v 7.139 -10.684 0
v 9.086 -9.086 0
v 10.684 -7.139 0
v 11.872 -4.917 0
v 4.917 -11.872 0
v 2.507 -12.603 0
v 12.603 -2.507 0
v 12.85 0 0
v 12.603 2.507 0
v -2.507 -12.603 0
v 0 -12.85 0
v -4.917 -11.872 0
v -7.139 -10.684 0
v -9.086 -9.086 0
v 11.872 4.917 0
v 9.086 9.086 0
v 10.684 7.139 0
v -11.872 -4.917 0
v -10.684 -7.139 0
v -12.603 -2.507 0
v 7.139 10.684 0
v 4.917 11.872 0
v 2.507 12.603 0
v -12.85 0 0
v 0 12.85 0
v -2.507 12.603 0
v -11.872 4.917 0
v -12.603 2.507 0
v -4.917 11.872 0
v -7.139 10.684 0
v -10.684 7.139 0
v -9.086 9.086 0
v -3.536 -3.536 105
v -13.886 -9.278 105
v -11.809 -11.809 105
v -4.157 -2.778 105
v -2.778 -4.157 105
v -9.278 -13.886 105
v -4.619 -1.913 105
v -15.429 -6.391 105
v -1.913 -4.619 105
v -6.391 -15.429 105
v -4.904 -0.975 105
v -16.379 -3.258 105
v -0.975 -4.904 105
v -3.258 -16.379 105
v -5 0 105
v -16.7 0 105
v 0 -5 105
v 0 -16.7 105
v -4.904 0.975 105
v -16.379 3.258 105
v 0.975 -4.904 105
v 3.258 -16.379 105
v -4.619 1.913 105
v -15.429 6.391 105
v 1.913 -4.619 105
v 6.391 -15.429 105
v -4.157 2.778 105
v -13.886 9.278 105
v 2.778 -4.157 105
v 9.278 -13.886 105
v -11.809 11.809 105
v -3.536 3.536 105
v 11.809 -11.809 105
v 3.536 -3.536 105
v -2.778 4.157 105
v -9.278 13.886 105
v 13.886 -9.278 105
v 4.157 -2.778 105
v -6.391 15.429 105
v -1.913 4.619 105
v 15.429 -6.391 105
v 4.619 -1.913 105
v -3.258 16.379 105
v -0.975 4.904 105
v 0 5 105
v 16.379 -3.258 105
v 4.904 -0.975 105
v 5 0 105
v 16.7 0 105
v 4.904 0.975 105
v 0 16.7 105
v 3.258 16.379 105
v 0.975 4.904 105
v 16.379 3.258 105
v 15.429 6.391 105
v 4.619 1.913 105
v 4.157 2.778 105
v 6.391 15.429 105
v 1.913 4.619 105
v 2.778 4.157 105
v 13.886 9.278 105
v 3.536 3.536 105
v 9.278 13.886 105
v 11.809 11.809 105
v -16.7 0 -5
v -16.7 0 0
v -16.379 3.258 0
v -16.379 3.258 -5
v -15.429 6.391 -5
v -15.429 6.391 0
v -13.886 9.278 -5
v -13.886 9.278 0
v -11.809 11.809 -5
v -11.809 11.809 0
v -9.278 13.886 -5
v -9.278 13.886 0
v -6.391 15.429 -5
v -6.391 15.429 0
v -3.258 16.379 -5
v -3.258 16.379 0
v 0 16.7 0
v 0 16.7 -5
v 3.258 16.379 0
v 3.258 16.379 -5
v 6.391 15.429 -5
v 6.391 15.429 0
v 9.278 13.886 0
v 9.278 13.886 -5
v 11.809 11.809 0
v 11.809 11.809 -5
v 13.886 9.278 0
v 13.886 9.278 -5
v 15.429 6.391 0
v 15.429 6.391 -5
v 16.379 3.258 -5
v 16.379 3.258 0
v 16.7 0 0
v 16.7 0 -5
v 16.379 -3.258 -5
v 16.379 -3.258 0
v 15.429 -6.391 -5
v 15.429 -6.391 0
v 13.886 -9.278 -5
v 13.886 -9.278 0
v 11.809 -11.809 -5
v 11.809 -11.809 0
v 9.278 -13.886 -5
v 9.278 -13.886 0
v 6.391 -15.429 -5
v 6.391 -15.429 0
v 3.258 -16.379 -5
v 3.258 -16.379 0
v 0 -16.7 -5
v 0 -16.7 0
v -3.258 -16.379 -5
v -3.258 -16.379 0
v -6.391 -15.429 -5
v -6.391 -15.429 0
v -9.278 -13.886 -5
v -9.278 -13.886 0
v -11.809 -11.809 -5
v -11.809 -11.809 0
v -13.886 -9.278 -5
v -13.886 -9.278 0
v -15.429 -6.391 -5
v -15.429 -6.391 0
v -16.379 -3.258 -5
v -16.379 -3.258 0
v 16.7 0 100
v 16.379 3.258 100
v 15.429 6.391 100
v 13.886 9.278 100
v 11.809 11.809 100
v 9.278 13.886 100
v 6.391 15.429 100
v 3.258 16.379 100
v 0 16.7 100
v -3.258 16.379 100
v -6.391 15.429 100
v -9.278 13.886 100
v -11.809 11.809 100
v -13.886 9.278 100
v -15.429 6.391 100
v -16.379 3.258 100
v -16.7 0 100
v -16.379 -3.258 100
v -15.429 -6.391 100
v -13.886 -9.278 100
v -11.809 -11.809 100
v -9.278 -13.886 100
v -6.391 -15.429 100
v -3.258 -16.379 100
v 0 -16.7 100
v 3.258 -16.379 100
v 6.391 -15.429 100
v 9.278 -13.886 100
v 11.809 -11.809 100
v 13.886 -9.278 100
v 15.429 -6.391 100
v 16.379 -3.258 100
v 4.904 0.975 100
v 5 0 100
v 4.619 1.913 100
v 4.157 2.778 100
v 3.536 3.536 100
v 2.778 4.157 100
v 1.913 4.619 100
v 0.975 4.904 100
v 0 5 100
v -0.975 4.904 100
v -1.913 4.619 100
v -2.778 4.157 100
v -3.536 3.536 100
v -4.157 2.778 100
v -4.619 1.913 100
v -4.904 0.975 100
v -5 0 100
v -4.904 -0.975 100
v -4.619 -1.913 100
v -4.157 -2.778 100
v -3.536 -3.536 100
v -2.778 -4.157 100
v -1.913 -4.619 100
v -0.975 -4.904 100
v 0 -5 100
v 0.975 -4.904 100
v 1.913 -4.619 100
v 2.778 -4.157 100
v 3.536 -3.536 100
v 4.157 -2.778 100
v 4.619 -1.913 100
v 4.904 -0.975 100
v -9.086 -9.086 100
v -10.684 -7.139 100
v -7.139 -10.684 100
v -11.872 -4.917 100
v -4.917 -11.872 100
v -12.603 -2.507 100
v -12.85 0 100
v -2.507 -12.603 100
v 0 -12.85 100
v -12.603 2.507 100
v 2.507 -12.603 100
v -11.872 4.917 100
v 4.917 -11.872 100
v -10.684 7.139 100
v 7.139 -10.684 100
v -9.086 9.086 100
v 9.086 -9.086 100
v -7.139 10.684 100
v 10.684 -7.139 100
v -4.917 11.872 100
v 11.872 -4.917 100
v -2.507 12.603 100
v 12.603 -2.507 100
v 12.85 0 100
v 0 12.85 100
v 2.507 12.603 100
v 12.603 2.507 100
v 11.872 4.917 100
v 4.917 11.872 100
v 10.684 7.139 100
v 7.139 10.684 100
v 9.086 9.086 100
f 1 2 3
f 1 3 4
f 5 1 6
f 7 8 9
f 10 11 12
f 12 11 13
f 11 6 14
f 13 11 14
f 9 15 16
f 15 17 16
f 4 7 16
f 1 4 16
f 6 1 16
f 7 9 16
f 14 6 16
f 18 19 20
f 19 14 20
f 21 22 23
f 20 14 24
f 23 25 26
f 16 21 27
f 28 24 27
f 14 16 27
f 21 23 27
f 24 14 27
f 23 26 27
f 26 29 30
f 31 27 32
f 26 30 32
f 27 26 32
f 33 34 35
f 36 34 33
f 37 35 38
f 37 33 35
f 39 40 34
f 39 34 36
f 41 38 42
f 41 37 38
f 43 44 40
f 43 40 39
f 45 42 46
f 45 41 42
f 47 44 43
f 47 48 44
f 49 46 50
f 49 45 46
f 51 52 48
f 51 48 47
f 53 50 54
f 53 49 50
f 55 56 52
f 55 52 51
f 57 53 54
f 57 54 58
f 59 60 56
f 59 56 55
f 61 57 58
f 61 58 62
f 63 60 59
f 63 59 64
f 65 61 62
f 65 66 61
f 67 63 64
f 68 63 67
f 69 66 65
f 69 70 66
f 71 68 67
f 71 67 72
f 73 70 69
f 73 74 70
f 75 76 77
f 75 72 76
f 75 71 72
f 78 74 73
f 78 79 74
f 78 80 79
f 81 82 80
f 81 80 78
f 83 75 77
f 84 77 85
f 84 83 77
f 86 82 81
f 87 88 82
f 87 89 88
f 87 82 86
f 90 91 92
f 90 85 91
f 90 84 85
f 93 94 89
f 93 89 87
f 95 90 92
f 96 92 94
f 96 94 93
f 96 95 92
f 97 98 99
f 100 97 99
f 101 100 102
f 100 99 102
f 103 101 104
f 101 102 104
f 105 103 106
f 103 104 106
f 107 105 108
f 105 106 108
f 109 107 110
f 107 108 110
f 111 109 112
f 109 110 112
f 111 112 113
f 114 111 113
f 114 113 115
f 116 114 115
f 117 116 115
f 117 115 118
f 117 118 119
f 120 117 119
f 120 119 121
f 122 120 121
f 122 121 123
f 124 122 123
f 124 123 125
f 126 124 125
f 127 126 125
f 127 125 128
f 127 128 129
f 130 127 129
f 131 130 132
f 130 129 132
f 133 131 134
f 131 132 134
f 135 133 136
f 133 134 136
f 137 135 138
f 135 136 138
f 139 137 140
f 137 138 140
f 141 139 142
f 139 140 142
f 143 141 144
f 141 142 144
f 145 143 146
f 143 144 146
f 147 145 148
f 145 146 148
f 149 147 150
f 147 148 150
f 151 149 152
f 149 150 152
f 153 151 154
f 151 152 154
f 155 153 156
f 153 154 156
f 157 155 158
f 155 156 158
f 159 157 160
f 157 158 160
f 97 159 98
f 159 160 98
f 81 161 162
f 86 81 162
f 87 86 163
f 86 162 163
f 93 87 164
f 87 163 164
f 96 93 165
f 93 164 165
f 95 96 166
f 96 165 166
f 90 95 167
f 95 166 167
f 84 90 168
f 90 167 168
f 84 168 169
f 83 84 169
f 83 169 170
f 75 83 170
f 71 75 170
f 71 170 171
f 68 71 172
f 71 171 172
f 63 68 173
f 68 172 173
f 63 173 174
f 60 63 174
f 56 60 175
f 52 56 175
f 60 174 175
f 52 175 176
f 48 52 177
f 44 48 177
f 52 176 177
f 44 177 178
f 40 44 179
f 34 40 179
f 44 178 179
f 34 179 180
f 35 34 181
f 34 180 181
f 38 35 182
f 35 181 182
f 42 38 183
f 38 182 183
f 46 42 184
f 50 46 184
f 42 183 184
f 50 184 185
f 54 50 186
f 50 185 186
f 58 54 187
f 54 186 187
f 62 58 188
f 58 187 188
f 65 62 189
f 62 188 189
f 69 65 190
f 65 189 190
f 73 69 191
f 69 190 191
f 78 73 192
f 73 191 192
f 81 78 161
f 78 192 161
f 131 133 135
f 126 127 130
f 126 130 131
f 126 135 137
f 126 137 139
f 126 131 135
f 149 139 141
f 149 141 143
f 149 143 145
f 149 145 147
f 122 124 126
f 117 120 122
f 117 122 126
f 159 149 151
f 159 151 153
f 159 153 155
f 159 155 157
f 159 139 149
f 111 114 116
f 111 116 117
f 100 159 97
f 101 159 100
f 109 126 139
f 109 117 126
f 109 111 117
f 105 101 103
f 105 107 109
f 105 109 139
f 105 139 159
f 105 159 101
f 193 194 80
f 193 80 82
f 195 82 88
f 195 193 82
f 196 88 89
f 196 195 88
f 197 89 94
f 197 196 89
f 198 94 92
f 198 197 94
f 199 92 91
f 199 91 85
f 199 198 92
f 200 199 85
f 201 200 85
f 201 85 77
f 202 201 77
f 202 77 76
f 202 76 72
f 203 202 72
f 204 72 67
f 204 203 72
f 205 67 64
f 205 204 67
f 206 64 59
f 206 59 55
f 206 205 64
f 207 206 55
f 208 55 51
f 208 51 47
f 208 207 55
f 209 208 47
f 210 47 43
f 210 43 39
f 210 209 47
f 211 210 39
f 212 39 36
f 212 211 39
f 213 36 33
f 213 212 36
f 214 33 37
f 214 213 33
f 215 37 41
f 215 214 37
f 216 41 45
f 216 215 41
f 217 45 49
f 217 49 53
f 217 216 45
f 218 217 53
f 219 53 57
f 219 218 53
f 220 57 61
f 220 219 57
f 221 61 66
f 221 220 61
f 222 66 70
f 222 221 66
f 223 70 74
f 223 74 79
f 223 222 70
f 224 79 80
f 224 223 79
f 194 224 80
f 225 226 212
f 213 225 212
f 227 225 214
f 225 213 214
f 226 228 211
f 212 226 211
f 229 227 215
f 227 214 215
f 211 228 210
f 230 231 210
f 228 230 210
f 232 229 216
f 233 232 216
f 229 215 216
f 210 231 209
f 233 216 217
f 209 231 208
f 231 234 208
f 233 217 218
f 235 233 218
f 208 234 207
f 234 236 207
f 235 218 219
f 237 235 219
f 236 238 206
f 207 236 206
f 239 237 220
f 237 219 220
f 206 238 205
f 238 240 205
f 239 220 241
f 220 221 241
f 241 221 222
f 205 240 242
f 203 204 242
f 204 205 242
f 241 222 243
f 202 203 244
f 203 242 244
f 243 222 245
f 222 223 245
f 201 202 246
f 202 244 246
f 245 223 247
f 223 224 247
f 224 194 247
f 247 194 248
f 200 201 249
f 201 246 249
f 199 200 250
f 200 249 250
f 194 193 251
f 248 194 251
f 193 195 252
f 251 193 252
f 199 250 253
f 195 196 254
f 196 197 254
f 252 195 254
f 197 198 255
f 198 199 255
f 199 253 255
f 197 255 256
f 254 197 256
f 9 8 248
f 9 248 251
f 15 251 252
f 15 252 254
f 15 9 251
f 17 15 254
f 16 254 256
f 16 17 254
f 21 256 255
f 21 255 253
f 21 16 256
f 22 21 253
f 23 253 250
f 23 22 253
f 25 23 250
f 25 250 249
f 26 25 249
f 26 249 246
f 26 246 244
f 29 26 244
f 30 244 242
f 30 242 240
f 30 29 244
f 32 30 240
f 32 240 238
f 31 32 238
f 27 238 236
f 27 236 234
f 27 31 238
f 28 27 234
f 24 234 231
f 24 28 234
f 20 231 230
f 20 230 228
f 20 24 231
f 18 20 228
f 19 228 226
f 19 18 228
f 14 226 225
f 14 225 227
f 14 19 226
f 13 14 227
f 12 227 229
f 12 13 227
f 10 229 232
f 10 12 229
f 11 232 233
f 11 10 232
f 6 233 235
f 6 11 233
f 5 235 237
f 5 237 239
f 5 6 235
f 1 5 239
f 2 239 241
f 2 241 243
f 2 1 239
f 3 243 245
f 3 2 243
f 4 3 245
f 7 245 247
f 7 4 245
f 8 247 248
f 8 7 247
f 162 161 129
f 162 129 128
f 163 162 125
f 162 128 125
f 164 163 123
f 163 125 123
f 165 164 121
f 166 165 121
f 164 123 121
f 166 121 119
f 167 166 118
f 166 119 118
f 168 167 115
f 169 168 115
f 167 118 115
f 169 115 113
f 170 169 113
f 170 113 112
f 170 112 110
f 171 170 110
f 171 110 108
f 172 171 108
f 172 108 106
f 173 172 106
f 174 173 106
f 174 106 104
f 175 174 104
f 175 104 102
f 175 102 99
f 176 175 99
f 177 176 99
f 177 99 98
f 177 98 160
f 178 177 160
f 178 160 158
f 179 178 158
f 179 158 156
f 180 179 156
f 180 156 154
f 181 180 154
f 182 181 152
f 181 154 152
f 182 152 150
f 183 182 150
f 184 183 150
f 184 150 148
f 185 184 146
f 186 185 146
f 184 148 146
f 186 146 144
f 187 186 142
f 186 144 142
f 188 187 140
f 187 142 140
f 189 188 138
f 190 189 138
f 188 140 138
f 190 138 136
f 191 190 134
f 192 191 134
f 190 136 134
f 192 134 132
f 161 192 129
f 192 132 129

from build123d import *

# Parameters (mm, degrees)
SKETCH2_R           = 16.7
SKETCH2_R_2         = 12.85
BOSS_EXTRUDE1_DEPTH = 100
SKETCH3_R           = 16.7
BOSS_EXTRUDE2_DEPTH = 5
SKETCH4_R           = 16.7
SKETCH4_R_2         = 5
BOSS_EXTRUDE3_DEPTH = 5


with BuildPart() as part:
    # Sketch2 → Boss-Extrude1 (new body)
    with BuildSketch(Plane.XY):
        Circle(SKETCH2_R)
        Circle(SKETCH2_R_2, mode=Mode.SUBTRACT)
    extrude(amount=BOSS_EXTRUDE1_DEPTH)

    # Sketch3 → Boss-Extrude2 (add)
    with BuildSketch(Plane(origin=(0, 0, 0), x_dir=(-1, 0, 0), z_dir=(0, 0, -1))):
        Circle(SKETCH3_R)
    extrude(amount=BOSS_EXTRUDE2_DEPTH)

    # Sketch4 → Boss-Extrude3 (add)
    with BuildSketch(Plane.XY.offset(100)):
        Circle(SKETCH4_R)
        Circle(SKETCH4_R_2, mode=Mode.SUBTRACT)
    extrude(amount=BOSS_EXTRUDE3_DEPTH)


solid = part.part
